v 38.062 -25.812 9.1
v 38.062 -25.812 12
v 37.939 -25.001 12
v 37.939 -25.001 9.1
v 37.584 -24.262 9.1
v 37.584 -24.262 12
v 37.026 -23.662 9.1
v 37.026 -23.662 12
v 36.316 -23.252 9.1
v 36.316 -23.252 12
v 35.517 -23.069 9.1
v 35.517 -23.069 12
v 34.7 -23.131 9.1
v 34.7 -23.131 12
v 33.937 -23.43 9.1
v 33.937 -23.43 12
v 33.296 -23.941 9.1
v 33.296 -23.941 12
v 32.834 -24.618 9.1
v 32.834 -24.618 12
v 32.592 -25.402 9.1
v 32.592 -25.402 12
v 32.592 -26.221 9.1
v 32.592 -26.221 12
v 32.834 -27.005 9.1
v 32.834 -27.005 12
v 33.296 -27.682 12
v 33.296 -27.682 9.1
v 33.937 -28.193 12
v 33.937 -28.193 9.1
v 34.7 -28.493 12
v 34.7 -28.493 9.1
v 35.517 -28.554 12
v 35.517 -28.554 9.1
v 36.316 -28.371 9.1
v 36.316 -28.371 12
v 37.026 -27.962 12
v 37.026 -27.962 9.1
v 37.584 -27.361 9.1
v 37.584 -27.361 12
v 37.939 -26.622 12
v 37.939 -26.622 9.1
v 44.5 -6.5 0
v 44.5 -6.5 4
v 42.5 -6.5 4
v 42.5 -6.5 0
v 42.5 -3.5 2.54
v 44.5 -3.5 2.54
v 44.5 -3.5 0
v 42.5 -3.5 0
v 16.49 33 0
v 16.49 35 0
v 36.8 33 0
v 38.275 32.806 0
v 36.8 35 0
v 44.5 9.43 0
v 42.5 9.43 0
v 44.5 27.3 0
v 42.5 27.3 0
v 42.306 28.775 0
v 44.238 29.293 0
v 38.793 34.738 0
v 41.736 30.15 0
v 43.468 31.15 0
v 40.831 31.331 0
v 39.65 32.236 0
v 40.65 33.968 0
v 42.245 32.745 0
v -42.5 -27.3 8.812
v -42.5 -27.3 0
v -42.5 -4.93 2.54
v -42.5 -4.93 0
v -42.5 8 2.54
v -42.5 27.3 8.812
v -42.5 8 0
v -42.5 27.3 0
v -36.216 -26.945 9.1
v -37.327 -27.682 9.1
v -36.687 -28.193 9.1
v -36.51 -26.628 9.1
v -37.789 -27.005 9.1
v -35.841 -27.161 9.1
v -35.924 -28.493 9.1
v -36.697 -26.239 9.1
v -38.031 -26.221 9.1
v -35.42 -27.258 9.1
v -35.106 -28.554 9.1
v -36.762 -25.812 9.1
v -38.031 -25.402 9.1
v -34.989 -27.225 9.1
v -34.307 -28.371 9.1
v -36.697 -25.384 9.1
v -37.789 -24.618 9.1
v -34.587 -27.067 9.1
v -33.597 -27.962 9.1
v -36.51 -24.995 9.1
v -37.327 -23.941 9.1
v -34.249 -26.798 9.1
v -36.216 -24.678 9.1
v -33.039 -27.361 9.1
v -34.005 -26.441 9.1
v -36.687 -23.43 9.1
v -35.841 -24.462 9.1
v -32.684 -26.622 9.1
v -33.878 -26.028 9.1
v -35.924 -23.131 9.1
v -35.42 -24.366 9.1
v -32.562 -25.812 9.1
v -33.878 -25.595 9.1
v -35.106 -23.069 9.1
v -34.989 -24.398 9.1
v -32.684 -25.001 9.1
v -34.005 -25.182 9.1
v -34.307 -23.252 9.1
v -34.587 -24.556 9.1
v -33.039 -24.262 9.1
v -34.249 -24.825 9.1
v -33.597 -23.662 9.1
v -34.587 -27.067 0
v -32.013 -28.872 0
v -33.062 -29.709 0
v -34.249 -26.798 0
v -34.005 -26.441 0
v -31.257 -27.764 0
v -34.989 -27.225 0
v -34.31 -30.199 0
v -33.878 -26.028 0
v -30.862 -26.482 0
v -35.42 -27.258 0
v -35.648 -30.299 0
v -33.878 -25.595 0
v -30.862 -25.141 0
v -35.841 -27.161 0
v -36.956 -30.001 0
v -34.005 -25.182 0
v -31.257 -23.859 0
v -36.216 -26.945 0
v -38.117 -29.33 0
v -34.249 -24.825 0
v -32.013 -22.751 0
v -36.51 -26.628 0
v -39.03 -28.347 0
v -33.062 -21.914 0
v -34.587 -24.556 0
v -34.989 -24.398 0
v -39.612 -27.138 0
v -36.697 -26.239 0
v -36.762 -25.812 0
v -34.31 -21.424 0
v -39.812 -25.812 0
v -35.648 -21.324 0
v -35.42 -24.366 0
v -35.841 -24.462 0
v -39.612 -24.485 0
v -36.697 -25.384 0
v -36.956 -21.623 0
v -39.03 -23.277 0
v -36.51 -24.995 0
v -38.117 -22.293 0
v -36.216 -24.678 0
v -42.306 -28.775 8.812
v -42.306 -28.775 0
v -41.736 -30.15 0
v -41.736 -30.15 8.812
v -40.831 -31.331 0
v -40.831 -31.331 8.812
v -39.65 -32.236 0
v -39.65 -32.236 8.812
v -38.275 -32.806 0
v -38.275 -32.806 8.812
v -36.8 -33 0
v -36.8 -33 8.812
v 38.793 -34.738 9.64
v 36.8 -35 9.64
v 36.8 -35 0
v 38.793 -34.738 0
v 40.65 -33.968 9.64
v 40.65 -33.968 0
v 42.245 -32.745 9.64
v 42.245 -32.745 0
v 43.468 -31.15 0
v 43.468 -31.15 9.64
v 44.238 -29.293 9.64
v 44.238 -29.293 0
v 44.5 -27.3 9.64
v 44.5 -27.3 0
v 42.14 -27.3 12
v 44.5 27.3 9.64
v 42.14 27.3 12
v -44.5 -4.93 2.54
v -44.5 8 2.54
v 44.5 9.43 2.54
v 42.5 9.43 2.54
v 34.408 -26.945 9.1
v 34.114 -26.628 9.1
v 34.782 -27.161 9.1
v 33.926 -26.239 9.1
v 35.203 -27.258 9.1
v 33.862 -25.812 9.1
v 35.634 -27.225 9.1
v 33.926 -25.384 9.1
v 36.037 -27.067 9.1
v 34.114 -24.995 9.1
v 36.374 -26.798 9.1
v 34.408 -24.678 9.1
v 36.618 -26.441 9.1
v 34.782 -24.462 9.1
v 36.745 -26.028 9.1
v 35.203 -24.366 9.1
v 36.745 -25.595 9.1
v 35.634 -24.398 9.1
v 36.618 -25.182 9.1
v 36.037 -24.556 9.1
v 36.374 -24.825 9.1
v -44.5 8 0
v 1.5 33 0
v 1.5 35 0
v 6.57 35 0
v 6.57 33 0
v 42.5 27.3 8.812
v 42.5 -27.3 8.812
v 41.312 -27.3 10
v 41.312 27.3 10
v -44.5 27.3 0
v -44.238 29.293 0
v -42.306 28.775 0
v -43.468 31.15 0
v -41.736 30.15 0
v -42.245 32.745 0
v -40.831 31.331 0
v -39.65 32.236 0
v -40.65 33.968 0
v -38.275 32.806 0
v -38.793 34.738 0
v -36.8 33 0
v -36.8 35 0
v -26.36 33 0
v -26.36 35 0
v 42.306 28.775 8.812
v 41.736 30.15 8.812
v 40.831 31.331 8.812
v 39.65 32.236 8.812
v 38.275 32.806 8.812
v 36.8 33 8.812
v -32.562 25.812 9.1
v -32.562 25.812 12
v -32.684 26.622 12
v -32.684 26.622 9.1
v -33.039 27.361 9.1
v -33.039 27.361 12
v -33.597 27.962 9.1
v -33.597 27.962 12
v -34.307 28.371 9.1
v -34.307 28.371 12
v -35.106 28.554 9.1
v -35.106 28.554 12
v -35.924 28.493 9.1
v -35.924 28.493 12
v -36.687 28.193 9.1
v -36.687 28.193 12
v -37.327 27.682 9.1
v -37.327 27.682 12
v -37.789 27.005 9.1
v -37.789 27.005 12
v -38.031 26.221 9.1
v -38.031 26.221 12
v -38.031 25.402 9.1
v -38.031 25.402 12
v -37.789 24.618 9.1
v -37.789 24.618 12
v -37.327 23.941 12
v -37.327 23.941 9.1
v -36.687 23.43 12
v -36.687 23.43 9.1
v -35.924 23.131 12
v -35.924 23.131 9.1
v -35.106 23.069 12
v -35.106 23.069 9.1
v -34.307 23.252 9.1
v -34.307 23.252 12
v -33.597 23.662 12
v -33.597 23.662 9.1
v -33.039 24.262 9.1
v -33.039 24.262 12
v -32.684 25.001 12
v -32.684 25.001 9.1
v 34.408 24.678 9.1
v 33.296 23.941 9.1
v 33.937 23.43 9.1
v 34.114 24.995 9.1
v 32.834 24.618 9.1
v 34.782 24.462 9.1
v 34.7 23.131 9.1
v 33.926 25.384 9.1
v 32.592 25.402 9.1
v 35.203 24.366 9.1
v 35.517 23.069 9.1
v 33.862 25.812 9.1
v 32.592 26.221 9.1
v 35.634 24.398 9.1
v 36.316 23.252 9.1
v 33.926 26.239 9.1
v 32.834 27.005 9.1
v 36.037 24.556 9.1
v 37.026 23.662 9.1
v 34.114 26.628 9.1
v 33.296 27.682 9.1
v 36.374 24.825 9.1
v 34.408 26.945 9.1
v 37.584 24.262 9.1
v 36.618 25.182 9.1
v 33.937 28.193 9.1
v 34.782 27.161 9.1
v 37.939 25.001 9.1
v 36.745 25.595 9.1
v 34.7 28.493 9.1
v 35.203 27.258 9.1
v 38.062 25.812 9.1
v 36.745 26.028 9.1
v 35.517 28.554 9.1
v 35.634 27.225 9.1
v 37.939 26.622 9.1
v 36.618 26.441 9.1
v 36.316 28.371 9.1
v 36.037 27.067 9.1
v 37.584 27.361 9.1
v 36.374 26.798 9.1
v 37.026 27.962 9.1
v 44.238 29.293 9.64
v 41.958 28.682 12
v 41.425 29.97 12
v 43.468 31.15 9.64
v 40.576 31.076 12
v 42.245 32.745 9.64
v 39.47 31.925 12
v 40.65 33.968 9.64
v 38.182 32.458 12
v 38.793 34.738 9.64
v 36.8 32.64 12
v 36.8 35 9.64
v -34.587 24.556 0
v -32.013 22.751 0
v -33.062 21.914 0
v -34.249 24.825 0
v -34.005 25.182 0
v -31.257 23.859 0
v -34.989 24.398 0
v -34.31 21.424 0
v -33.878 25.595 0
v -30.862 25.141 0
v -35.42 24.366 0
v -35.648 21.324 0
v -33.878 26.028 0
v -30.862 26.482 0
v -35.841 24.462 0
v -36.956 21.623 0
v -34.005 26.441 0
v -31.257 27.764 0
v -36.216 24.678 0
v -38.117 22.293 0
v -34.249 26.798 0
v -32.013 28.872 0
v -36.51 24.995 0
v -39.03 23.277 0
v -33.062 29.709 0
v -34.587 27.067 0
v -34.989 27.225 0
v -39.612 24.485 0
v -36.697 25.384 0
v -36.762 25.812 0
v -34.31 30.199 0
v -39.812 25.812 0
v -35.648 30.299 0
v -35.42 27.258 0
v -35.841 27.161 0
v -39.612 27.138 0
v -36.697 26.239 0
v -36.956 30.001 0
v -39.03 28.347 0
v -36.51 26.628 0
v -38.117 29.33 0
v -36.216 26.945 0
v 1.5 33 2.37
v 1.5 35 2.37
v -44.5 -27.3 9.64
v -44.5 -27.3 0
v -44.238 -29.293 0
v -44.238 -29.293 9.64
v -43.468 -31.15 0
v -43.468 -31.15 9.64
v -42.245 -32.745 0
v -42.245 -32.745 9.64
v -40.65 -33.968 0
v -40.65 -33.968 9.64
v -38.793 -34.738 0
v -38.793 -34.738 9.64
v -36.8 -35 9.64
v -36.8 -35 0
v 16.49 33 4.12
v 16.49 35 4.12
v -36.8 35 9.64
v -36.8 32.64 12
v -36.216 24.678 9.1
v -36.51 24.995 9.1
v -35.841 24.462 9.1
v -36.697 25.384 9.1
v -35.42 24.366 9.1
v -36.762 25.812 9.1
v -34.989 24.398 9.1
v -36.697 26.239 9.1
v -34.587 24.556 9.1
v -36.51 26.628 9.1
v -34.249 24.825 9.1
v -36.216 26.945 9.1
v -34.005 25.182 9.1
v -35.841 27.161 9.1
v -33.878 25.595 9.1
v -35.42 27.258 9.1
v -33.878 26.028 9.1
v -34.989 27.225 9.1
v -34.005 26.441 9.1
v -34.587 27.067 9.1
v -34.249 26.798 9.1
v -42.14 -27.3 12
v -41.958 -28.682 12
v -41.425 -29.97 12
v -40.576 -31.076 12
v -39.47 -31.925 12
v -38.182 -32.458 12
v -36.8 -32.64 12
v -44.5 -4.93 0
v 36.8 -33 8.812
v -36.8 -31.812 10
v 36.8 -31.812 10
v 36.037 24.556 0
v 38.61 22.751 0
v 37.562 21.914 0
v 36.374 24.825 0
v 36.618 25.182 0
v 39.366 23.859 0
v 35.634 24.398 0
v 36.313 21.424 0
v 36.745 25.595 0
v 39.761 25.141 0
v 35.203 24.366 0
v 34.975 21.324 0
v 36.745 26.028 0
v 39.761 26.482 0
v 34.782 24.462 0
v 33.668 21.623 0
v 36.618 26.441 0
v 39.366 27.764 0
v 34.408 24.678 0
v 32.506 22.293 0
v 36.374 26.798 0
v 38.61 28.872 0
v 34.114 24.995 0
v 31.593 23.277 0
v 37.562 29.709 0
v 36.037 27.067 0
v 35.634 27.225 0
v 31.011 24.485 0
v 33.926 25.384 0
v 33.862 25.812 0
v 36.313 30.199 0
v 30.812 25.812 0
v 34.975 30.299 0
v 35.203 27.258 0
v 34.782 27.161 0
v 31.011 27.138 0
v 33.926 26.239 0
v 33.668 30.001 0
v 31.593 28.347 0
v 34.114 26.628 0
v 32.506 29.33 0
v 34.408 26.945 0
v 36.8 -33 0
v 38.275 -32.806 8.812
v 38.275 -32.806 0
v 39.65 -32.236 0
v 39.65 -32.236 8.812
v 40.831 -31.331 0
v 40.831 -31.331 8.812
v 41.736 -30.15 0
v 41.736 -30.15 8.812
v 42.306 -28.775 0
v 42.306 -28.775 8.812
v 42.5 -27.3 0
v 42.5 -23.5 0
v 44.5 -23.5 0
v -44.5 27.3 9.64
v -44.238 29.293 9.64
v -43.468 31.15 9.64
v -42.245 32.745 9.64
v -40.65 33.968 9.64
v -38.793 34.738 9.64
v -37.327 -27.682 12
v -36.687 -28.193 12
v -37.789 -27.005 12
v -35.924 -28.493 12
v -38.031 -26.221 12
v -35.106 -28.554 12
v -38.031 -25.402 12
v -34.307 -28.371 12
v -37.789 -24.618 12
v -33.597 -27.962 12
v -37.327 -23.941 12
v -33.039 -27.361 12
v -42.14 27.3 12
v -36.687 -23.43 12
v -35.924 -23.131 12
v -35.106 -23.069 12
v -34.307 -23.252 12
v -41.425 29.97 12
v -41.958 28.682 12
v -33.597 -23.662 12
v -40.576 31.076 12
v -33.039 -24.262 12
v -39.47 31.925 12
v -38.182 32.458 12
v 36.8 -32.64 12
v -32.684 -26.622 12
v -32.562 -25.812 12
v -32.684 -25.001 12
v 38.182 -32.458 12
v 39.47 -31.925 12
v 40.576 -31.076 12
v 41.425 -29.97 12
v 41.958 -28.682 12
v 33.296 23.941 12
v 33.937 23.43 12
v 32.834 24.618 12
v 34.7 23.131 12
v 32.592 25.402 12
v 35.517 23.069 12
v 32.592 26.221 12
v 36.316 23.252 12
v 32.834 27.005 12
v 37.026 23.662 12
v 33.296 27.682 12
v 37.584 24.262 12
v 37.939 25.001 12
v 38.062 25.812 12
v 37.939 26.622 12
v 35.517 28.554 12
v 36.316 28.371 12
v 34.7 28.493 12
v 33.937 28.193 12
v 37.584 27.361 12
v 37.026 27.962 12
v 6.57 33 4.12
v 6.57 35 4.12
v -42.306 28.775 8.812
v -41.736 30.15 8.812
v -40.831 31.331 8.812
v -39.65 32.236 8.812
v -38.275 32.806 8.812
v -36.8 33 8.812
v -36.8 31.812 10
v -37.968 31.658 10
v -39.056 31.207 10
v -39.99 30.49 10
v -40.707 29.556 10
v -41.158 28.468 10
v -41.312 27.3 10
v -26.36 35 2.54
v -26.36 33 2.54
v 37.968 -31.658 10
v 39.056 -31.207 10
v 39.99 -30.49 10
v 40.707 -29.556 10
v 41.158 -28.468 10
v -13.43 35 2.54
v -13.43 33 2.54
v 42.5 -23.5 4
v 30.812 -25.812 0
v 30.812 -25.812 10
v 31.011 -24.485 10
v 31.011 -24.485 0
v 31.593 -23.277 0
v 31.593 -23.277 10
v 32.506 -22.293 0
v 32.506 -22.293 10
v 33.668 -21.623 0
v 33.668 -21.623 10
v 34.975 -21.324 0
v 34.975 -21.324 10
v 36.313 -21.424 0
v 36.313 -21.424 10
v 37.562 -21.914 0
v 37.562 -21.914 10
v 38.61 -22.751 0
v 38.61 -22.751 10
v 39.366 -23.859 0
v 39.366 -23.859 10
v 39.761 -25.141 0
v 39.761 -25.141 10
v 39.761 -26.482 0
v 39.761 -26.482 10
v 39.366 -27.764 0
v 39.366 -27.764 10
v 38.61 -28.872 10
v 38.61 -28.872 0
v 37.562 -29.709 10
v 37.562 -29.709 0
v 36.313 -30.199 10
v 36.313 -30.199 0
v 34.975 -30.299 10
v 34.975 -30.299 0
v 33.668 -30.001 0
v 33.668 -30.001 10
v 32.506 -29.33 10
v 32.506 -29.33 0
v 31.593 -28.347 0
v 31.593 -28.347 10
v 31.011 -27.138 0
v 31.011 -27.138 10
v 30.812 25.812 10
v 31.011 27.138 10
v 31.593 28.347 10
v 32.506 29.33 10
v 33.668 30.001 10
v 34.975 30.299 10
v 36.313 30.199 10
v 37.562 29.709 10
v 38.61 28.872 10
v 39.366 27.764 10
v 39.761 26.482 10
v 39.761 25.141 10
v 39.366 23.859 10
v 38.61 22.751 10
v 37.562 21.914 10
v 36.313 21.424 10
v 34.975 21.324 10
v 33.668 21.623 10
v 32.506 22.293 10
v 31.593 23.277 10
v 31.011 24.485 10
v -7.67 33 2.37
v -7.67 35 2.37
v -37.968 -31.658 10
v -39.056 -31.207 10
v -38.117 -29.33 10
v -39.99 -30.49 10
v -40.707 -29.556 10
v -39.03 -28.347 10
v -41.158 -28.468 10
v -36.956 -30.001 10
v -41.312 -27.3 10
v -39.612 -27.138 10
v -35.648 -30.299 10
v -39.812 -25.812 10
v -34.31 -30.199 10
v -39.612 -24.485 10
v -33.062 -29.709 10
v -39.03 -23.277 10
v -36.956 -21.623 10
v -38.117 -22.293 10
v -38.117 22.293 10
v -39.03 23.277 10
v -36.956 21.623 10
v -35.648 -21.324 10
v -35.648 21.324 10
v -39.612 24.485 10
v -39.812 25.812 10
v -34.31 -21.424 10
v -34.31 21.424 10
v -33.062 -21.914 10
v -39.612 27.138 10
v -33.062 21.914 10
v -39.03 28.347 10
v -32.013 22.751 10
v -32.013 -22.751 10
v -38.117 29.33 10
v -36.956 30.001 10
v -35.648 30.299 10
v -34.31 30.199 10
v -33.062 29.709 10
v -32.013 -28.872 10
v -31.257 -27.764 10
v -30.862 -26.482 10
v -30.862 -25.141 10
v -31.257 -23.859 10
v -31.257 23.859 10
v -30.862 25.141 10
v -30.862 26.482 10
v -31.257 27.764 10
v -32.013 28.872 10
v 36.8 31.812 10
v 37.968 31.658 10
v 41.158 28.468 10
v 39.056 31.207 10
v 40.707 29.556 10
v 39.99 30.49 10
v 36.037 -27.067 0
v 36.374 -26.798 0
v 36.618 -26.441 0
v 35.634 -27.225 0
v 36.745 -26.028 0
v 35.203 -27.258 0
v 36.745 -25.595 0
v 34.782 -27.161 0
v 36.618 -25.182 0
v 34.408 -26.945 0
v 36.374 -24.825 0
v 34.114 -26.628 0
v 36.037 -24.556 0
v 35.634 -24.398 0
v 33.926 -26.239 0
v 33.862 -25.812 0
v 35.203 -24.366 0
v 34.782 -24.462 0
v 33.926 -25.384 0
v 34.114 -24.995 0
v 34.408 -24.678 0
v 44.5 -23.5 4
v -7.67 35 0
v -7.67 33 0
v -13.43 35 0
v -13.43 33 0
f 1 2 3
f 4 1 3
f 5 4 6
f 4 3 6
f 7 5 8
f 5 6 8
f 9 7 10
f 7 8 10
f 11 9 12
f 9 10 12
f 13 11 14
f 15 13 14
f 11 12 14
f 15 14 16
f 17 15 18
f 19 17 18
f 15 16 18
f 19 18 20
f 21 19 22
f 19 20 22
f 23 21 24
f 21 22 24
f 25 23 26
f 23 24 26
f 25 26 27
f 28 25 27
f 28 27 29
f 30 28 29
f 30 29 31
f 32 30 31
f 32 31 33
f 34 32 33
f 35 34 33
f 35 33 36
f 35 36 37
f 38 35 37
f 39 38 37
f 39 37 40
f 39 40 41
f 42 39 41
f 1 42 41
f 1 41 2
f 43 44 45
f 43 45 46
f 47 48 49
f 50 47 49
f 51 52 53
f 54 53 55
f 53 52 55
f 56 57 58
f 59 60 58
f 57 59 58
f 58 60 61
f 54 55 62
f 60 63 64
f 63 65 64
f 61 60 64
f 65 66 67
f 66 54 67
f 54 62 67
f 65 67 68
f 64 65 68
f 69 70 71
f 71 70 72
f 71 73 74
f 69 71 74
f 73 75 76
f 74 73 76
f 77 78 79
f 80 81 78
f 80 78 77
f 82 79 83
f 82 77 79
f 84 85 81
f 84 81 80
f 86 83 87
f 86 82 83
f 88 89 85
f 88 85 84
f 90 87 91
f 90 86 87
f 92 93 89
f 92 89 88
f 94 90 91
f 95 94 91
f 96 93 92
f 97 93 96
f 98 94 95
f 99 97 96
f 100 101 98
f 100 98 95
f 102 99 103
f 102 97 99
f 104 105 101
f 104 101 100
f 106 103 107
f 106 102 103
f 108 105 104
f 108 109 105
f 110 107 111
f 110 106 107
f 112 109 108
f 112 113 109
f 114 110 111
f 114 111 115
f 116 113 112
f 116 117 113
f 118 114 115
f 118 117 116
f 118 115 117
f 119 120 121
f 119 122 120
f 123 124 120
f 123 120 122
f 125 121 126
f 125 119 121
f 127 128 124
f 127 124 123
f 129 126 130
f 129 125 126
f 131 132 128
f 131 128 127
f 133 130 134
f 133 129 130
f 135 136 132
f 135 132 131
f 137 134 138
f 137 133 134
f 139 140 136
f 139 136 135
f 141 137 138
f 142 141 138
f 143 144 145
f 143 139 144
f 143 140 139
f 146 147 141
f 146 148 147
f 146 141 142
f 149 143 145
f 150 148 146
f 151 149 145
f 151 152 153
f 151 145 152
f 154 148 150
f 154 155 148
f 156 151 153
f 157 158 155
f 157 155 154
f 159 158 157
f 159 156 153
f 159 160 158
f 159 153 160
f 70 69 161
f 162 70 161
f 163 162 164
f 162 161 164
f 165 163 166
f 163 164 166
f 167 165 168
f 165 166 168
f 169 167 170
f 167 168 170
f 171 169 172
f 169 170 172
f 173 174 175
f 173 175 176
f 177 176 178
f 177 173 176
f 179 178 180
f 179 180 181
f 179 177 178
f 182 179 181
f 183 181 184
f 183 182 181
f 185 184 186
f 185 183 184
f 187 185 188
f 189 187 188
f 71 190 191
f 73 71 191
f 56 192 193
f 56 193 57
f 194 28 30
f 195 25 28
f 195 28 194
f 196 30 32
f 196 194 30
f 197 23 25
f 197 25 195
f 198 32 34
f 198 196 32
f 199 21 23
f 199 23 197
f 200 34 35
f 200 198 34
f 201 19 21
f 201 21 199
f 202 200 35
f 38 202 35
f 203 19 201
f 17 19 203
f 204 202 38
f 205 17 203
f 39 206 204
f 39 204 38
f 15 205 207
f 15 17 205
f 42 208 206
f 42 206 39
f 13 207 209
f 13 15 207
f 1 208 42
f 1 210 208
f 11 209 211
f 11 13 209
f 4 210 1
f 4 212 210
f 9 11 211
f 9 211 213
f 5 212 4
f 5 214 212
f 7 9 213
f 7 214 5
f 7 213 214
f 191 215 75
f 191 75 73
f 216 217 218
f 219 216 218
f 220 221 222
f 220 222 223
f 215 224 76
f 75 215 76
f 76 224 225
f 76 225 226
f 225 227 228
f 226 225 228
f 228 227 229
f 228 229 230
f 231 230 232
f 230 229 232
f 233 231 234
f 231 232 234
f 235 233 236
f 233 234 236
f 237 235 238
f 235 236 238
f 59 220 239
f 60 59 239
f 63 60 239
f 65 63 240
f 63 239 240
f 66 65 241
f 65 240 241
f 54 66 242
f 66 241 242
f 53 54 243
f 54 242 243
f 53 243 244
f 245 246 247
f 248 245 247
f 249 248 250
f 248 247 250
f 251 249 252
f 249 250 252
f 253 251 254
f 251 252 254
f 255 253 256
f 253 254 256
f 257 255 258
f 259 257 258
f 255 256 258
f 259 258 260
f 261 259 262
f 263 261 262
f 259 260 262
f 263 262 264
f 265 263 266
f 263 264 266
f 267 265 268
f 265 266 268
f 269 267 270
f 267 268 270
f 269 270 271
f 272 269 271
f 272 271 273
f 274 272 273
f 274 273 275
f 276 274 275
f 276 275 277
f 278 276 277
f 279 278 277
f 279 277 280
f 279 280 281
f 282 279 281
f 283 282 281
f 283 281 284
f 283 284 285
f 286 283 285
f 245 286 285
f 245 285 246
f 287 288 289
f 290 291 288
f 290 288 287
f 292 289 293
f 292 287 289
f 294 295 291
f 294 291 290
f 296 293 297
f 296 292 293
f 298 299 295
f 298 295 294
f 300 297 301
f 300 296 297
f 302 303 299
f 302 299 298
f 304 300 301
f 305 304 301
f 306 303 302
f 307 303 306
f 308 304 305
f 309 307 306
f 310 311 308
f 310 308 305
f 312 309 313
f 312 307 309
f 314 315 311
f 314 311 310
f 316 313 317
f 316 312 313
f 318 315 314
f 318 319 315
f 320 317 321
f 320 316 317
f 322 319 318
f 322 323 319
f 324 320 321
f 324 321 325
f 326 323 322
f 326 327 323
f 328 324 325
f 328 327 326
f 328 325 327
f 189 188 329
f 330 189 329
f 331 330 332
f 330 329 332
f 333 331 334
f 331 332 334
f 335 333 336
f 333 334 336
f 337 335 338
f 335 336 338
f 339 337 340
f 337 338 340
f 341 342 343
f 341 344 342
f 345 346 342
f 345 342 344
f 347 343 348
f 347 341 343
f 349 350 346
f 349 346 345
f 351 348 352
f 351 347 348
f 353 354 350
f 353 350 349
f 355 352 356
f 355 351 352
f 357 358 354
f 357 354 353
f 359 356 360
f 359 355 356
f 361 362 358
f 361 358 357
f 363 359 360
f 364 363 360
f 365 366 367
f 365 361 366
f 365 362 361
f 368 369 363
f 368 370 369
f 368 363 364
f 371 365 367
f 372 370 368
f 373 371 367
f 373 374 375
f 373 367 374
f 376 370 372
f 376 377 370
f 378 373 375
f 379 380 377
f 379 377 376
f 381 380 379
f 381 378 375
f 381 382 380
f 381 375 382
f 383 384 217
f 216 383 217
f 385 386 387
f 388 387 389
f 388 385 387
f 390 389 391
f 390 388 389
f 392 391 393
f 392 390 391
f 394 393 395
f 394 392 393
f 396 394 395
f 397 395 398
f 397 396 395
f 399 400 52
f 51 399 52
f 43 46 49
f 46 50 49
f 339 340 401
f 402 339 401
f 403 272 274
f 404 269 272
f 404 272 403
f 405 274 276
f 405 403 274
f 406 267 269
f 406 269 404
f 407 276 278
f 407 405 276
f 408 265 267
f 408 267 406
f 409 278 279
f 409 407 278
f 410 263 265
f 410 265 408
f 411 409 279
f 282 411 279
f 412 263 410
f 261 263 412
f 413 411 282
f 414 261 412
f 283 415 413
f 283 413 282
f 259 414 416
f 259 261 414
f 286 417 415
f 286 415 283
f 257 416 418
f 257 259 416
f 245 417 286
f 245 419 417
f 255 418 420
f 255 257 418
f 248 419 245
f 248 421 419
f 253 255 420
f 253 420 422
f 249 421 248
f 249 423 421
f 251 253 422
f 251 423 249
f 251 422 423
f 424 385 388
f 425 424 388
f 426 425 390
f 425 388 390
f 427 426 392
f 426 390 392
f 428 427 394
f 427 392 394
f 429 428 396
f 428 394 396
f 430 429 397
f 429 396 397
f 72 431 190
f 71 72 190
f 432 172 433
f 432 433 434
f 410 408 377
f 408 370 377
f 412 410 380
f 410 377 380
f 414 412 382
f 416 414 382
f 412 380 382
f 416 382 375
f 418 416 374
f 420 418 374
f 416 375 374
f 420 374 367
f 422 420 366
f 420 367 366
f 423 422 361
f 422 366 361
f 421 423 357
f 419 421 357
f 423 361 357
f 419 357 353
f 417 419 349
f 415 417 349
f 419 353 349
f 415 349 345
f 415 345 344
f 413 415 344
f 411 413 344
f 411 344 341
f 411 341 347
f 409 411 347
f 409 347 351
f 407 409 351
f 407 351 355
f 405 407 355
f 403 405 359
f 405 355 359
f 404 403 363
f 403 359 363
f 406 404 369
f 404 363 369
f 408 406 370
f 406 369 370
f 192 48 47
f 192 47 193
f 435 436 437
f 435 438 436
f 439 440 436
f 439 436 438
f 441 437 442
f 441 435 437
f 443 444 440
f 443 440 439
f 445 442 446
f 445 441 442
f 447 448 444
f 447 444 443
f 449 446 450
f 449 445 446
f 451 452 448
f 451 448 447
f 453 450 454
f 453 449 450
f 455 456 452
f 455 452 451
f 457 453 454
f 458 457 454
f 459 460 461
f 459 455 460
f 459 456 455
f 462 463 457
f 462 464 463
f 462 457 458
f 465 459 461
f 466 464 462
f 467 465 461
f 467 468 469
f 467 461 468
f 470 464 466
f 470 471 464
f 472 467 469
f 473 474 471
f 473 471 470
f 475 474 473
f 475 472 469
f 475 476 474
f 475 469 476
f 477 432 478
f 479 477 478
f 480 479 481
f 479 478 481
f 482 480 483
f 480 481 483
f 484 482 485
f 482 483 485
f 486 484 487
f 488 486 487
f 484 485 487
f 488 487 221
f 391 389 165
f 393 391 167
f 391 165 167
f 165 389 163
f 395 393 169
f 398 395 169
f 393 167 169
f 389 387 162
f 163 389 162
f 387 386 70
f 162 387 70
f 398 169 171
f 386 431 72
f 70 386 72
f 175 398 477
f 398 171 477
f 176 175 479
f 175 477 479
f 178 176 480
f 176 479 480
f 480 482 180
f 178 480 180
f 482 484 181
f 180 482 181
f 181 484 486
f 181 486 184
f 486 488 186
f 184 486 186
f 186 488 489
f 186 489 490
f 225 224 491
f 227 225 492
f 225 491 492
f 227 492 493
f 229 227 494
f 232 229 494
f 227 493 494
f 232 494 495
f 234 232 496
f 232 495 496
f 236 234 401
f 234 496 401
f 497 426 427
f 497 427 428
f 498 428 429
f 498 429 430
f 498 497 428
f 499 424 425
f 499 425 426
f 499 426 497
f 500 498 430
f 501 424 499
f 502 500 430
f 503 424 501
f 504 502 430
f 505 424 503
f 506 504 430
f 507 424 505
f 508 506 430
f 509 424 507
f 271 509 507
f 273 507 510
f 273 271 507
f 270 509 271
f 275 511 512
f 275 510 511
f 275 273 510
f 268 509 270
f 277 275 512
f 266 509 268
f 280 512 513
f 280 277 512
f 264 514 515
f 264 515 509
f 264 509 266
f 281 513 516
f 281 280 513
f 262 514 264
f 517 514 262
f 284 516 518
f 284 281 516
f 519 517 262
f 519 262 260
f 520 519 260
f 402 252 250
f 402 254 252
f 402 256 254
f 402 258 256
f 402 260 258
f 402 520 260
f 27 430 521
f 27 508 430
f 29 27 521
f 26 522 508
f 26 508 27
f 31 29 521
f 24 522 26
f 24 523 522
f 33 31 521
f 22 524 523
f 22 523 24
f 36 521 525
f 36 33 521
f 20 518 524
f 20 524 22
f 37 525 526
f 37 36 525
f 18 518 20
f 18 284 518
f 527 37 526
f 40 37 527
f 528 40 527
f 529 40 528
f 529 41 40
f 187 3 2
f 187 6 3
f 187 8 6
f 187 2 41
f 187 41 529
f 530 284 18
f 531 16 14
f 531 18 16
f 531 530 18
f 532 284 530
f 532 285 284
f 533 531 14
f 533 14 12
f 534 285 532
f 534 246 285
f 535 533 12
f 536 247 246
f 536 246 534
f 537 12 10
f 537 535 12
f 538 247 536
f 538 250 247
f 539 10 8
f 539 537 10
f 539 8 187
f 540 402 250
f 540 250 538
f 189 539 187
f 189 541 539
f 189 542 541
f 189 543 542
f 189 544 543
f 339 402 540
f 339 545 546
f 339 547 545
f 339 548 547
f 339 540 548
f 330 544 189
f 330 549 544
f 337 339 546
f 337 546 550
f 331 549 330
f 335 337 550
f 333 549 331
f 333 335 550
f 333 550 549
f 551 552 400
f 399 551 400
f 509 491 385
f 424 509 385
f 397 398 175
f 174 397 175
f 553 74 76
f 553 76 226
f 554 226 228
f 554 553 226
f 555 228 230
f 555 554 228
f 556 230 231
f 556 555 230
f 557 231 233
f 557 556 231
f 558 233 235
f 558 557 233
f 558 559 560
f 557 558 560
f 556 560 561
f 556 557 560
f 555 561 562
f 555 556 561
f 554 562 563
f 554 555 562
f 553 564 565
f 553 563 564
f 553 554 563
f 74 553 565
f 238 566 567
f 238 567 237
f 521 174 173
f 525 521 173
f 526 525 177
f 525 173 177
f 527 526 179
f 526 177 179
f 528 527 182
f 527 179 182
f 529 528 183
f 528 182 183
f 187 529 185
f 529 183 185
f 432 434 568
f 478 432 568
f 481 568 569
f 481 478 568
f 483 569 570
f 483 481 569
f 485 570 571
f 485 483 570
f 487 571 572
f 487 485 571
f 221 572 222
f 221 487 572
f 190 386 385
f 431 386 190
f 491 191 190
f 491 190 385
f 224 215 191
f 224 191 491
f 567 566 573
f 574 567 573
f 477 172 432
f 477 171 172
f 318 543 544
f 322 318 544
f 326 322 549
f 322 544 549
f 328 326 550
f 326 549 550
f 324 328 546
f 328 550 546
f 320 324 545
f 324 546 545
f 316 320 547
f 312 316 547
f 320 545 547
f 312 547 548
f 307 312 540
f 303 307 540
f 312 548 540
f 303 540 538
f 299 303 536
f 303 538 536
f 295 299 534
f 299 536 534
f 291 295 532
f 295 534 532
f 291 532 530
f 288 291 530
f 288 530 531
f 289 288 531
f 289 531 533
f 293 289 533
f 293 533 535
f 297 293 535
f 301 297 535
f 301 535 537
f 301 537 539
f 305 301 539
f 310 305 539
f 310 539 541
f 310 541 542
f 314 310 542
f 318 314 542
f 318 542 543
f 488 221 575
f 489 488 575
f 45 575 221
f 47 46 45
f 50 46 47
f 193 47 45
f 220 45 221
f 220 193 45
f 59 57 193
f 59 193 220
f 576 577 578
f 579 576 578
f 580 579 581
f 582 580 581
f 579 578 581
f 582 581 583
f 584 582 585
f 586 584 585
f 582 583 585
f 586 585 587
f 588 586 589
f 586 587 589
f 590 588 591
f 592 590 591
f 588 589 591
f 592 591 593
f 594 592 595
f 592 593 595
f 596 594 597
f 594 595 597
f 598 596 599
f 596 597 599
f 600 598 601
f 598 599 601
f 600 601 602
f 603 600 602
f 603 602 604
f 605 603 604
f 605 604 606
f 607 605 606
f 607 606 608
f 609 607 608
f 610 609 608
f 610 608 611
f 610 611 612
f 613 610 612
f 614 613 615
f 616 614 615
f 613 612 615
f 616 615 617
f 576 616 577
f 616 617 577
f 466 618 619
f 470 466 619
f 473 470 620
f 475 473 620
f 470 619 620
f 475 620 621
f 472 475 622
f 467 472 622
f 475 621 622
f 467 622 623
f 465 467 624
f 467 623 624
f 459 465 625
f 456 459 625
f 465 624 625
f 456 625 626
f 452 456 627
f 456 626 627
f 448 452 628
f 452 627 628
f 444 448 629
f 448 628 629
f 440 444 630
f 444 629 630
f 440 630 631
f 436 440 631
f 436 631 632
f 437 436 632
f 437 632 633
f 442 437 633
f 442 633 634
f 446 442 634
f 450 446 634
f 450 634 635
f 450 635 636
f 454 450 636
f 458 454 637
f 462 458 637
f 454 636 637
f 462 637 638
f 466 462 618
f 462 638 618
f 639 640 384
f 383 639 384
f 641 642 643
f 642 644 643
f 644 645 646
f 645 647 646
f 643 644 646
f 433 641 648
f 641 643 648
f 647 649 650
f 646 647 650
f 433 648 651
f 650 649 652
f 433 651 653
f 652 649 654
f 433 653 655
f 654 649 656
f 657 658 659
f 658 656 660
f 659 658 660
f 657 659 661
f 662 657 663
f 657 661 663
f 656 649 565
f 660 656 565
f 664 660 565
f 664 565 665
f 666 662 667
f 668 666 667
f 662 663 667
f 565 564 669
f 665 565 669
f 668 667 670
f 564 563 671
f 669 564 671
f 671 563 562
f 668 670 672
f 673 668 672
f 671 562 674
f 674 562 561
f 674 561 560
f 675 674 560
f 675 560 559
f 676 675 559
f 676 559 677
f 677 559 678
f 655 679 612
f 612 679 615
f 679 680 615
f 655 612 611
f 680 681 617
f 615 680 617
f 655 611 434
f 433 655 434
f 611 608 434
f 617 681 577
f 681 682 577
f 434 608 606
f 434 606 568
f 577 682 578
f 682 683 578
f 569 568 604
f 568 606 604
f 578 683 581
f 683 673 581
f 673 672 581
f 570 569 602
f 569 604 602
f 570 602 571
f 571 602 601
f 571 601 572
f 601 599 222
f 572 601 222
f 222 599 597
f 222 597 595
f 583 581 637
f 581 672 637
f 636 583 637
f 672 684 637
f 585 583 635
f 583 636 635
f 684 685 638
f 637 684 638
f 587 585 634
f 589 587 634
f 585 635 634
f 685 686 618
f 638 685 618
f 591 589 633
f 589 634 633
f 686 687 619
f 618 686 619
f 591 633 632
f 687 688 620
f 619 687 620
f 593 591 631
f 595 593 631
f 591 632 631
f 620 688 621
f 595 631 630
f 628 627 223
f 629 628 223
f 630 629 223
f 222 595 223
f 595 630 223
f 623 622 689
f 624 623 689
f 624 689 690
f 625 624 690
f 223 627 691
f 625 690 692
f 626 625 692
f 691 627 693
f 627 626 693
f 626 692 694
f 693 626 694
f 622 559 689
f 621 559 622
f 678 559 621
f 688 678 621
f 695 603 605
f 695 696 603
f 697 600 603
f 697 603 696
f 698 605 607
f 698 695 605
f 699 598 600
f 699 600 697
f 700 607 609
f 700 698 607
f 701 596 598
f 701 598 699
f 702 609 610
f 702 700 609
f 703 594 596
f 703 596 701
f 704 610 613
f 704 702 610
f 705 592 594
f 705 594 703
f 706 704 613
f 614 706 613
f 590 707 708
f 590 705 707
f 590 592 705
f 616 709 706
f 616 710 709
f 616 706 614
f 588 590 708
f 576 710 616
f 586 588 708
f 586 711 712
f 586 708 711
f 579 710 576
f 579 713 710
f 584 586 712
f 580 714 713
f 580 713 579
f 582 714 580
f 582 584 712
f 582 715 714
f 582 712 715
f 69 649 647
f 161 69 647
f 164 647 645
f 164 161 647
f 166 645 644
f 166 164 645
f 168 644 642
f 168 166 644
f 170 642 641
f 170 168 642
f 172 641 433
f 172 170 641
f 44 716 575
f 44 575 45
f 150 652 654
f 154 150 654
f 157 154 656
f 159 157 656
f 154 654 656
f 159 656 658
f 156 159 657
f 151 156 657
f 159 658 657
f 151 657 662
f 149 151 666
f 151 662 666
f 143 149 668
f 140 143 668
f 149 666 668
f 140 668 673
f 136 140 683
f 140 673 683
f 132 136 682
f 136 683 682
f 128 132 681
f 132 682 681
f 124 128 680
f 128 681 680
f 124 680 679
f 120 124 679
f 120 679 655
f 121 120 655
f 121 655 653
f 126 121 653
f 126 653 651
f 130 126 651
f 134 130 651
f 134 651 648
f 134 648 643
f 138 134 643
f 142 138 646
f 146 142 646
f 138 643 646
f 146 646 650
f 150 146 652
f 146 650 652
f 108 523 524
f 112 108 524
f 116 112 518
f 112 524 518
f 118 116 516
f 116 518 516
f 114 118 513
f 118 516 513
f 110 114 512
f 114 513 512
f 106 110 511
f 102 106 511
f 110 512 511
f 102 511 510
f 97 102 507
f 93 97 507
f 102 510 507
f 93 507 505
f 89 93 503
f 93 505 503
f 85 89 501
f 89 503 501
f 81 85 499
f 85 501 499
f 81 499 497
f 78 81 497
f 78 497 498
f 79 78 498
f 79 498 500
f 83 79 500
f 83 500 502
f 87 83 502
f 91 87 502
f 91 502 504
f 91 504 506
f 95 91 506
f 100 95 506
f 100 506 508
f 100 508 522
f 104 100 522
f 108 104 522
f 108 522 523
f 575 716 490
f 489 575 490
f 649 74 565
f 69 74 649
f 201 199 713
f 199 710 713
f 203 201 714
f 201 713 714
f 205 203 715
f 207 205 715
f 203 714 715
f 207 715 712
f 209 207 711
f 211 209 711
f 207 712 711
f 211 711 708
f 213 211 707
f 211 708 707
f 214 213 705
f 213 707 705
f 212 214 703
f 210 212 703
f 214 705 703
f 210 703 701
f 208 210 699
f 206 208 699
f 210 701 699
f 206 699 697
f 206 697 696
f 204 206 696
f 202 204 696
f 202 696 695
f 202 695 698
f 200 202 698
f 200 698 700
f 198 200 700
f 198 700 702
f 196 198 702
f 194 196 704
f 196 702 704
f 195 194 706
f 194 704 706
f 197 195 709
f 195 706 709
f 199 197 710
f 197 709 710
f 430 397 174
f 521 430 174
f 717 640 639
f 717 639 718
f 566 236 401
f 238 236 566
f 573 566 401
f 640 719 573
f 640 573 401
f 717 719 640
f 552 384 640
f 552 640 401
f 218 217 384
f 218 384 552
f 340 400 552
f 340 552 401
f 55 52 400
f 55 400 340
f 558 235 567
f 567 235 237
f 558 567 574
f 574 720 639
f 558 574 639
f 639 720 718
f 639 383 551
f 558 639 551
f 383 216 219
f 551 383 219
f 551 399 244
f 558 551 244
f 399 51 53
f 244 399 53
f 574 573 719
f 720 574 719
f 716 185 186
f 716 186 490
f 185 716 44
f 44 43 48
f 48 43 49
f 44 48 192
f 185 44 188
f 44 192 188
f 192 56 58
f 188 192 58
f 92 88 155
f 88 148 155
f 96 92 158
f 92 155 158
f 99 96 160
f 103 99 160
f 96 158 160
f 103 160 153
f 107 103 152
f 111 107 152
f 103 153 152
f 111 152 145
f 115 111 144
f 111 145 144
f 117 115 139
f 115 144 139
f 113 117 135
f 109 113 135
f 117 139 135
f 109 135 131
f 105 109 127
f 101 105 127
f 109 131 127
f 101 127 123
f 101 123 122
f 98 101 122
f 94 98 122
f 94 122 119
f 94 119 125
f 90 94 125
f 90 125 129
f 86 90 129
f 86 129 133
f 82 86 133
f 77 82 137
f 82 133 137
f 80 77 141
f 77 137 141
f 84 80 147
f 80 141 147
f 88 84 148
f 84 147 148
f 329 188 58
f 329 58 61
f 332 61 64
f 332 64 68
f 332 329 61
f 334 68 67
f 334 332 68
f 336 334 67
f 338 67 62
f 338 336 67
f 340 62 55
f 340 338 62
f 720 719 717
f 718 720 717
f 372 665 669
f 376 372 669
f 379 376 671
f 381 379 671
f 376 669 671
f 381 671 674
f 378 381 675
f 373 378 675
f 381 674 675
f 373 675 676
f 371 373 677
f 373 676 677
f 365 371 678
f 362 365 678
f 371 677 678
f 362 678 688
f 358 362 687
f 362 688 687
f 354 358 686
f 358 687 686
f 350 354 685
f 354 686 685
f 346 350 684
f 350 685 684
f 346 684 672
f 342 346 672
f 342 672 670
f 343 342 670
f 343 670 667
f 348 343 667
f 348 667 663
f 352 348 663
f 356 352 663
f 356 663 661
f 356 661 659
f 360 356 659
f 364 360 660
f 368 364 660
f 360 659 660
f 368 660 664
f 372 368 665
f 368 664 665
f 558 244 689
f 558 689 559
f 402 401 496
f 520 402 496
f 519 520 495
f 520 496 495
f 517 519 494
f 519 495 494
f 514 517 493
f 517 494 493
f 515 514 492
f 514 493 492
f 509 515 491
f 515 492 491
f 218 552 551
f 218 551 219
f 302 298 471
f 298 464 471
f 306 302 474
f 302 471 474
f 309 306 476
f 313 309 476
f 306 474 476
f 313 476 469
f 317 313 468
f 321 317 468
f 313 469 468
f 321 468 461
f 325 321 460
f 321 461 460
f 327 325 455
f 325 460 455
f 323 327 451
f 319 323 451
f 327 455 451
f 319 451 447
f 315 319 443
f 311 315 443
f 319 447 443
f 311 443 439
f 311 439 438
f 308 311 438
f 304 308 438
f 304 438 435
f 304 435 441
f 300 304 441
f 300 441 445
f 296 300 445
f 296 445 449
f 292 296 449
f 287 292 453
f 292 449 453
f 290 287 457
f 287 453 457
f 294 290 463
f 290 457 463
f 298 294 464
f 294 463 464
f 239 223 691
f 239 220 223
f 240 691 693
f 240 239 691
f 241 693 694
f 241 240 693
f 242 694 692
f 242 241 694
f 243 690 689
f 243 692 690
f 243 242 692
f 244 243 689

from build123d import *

# Parameters (mm, degrees)
SKETCH_1_W                     = 89
SKETCH_1_H                     = 70
EXTRUDE_1_DEPTH                = 12
FILLET_1_R                     = 7.7
CHAMFER_1_SIZE                 = 2.36
SHELL_1_T                      = -2
CUT_EXTRUDE_1_REACH            = 72
SKETCH_2_W                     = 9.92
SKETCH_2_H                     = 4.12
SKETCH_2_W_2                   = 9.17
SKETCH_2_H_2                   = 2.37
SKETCH_2_W_3                   = 12.93
SKETCH_2_H_3                   = 2.54
CUT_EXTRUDE_2_REACH            = 91
SKETCH_3_W                     = 2.54
SKETCH_3_H                     = 12.93
SKETCH_3_W_2                   = 4
SKETCH_3_H_2                   = 17
CUT_EXTRUDE_3_REACH            = 91
SKETCH_4_W                     = 2.54
SKETCH_4_H                     = 12.93
SKETCH_5_R                     = 4.5
EXTRUDE_2_DEPTH                = 10
HOLE_WIZARD_M2_5_1_D           = 2.9
HOLE_WIZARD_M2_5_1_CBORE_D     = 5.5
HOLE_WIZARD_M2_5_1_CBORE_DEPTH = 2.9


with BuildPart() as part:
    # 草圖1 → 填料-伸長1 (new body)
    with BuildSketch(Plane.XY):
        Rectangle(SKETCH_1_W, SKETCH_1_H)
    extrude(amount=EXTRUDE_1_DEPTH)

    # 圓角1
    fillet_1_edges = [part.edges().sort_by_distance(p)[0] for p in [
        (44.5, -35, 6),
        (-44.5, -35, 6),
        (-44.5, 35, 6),
        (44.5, 35, 6),
    ]]
    fillet(fillet_1_edges, radius=FILLET_1_R)

    # 導角1
    chamfer_1_edges = [part.edges().sort_by_distance(p)[0] for p in [
        (0, -35, 12),
        (-44.5, 0, 12),
        (44.5, 0, 12),
        (0, 35, 12),
        (-42.244722215, 32.744722215, 12),
        (42.244722215, 32.744722215, 12),
        (42.244722215, -32.744722215, 12),
        (-42.244722215, -32.744722215, 12),
    ]]
    chamfer(chamfer_1_edges, length=CHAMFER_1_SIZE)

    # 薄殼1
    shell_1_openings = [part.faces().sort_by_distance(p)[0] for p in [
        (0, 0, 0),
    ]]
    offset(amount=SHELL_1_T, openings=shell_1_openings, kind=Kind.INTERSECTION)

    # 草圖2 → 除料-伸長1 (cut, up to next)
    with BuildSketch(Plane(origin=(0, 35, 0), x_dir=(1, 0, 0), z_dir=(0, 1, 0)), mode=Mode.PRIVATE) as cut_extrude_1_sk1:
        with Locations((11.53, -2.06)):
            Rectangle(SKETCH_2_W, SKETCH_2_H)
    cut_extrude_1_tool1 = extrude(cut_extrude_1_sk1.sketch, amount=-CUT_EXTRUDE_1_REACH, mode=Mode.PRIVATE) & part.part
    add(cut_extrude_1_tool1.solids().sort_by_distance((11.53, 35, 2.06))[0], mode=Mode.SUBTRACT)
    # 草圖2 → 除料-伸長1 (cut, up to next)
    with BuildSketch(Plane(origin=(0, 35, 0), x_dir=(1, 0, 0), z_dir=(0, 1, 0)), mode=Mode.PRIVATE) as cut_extrude_1_sk2:
        with Locations((-3.085, -1.185)):
            Rectangle(SKETCH_2_W_2, SKETCH_2_H_2)
    cut_extrude_1_tool2 = extrude(cut_extrude_1_sk2.sketch, amount=-CUT_EXTRUDE_1_REACH, mode=Mode.PRIVATE) & part.part
    add(cut_extrude_1_tool2.solids().sort_by_distance((-3.085, 35, 1.185))[0], mode=Mode.SUBTRACT)
    # 草圖2 → 除料-伸長1 (cut, up to next)
    with BuildSketch(Plane(origin=(0, 35, 0), x_dir=(1, 0, 0), z_dir=(0, 1, 0)), mode=Mode.PRIVATE) as cut_extrude_1_sk3:
        with Locations((-19.895, -1.27)):
            Rectangle(SKETCH_2_W_3, SKETCH_2_H_3)
    cut_extrude_1_tool3 = extrude(cut_extrude_1_sk3.sketch, amount=-CUT_EXTRUDE_1_REACH, mode=Mode.PRIVATE) & part.part
    add(cut_extrude_1_tool3.solids().sort_by_distance((-19.895, 35, 1.27))[0], mode=Mode.SUBTRACT)

    # 草圖3 → 除料-伸長2 (cut, up to next)
    with BuildSketch(Plane(origin=(44.5, 0, 0), x_dir=(0, 0, -1), z_dir=(1, 0, 0)), mode=Mode.PRIVATE) as cut_extrude_2_sk1:
        with Locations((-1.27, 2.965)):
            Rectangle(SKETCH_3_W, SKETCH_3_H)
    cut_extrude_2_tool1 = extrude(cut_extrude_2_sk1.sketch, amount=-CUT_EXTRUDE_2_REACH, mode=Mode.PRIVATE) & part.part
    add(cut_extrude_2_tool1.solids().sort_by_distance((44.5, 2.965, 1.27))[0], mode=Mode.SUBTRACT)
    # 草圖3 → 除料-伸長2 (cut, up to next)
    with BuildSketch(Plane(origin=(44.5, 0, 0), x_dir=(0, 0, -1), z_dir=(1, 0, 0)), mode=Mode.PRIVATE) as cut_extrude_2_sk2:
        with Locations((-2, -15)):
            Rectangle(SKETCH_3_W_2, SKETCH_3_H_2)
    cut_extrude_2_tool2 = extrude(cut_extrude_2_sk2.sketch, amount=-CUT_EXTRUDE_2_REACH, mode=Mode.PRIVATE) & part.part
    add(cut_extrude_2_tool2.solids().sort_by_distance((44.5, -15, 2))[0], mode=Mode.SUBTRACT)

    # 草圖4 → 除料-伸長3 (cut, up to next)
    with BuildSketch(Plane.ZY.offset(44.5), mode=Mode.PRIVATE) as cut_extrude_3_sk1:
        with Locations((1.27, 1.535)):
            Rectangle(SKETCH_4_W, SKETCH_4_H)
    cut_extrude_3_tool1 = extrude(cut_extrude_3_sk1.sketch, amount=-CUT_EXTRUDE_3_REACH, mode=Mode.PRIVATE) & part.part
    add(cut_extrude_3_tool1.solids().sort_by_distance((-44.5, 1.535, 1.27))[0], mode=Mode.SUBTRACT)

    # 草圖5 → 填料-伸長2 (add)
    with BuildSketch(Plane(origin=(0, 0, 10), x_dir=(-1, 0, 0), z_dir=(0, 0, -1))):
        with Locations((-35.311572875, 25.811572875)):
            Circle(SKETCH_5_R)
        with Locations((35.311572875, 25.811572875)):
            Circle(SKETCH_5_R)
        with Locations((35.311572875, -25.811572875)):
            Circle(SKETCH_5_R)
        with Locations((-35.311572875, -25.811572875)):
            Circle(SKETCH_5_R)
    extrude(amount=EXTRUDE_2_DEPTH)

    # M2.5 六角承窩頭蓋螺釘的柱孔1 (through all)
    with Locations(Plane(origin=(35.311572875, -25.811572875, 12), x_dir=(1, 0, 0), z_dir=(0, 0, 1))):
        with Locations((0, 0), (-70.62314575, 0), (-70.62314575, 51.62314575), (0, 51.62314575)):
            CounterBoreHole(HOLE_WIZARD_M2_5_1_D / 2, HOLE_WIZARD_M2_5_1_CBORE_D / 2, HOLE_WIZARD_M2_5_1_CBORE_DEPTH)


solid = part.part
